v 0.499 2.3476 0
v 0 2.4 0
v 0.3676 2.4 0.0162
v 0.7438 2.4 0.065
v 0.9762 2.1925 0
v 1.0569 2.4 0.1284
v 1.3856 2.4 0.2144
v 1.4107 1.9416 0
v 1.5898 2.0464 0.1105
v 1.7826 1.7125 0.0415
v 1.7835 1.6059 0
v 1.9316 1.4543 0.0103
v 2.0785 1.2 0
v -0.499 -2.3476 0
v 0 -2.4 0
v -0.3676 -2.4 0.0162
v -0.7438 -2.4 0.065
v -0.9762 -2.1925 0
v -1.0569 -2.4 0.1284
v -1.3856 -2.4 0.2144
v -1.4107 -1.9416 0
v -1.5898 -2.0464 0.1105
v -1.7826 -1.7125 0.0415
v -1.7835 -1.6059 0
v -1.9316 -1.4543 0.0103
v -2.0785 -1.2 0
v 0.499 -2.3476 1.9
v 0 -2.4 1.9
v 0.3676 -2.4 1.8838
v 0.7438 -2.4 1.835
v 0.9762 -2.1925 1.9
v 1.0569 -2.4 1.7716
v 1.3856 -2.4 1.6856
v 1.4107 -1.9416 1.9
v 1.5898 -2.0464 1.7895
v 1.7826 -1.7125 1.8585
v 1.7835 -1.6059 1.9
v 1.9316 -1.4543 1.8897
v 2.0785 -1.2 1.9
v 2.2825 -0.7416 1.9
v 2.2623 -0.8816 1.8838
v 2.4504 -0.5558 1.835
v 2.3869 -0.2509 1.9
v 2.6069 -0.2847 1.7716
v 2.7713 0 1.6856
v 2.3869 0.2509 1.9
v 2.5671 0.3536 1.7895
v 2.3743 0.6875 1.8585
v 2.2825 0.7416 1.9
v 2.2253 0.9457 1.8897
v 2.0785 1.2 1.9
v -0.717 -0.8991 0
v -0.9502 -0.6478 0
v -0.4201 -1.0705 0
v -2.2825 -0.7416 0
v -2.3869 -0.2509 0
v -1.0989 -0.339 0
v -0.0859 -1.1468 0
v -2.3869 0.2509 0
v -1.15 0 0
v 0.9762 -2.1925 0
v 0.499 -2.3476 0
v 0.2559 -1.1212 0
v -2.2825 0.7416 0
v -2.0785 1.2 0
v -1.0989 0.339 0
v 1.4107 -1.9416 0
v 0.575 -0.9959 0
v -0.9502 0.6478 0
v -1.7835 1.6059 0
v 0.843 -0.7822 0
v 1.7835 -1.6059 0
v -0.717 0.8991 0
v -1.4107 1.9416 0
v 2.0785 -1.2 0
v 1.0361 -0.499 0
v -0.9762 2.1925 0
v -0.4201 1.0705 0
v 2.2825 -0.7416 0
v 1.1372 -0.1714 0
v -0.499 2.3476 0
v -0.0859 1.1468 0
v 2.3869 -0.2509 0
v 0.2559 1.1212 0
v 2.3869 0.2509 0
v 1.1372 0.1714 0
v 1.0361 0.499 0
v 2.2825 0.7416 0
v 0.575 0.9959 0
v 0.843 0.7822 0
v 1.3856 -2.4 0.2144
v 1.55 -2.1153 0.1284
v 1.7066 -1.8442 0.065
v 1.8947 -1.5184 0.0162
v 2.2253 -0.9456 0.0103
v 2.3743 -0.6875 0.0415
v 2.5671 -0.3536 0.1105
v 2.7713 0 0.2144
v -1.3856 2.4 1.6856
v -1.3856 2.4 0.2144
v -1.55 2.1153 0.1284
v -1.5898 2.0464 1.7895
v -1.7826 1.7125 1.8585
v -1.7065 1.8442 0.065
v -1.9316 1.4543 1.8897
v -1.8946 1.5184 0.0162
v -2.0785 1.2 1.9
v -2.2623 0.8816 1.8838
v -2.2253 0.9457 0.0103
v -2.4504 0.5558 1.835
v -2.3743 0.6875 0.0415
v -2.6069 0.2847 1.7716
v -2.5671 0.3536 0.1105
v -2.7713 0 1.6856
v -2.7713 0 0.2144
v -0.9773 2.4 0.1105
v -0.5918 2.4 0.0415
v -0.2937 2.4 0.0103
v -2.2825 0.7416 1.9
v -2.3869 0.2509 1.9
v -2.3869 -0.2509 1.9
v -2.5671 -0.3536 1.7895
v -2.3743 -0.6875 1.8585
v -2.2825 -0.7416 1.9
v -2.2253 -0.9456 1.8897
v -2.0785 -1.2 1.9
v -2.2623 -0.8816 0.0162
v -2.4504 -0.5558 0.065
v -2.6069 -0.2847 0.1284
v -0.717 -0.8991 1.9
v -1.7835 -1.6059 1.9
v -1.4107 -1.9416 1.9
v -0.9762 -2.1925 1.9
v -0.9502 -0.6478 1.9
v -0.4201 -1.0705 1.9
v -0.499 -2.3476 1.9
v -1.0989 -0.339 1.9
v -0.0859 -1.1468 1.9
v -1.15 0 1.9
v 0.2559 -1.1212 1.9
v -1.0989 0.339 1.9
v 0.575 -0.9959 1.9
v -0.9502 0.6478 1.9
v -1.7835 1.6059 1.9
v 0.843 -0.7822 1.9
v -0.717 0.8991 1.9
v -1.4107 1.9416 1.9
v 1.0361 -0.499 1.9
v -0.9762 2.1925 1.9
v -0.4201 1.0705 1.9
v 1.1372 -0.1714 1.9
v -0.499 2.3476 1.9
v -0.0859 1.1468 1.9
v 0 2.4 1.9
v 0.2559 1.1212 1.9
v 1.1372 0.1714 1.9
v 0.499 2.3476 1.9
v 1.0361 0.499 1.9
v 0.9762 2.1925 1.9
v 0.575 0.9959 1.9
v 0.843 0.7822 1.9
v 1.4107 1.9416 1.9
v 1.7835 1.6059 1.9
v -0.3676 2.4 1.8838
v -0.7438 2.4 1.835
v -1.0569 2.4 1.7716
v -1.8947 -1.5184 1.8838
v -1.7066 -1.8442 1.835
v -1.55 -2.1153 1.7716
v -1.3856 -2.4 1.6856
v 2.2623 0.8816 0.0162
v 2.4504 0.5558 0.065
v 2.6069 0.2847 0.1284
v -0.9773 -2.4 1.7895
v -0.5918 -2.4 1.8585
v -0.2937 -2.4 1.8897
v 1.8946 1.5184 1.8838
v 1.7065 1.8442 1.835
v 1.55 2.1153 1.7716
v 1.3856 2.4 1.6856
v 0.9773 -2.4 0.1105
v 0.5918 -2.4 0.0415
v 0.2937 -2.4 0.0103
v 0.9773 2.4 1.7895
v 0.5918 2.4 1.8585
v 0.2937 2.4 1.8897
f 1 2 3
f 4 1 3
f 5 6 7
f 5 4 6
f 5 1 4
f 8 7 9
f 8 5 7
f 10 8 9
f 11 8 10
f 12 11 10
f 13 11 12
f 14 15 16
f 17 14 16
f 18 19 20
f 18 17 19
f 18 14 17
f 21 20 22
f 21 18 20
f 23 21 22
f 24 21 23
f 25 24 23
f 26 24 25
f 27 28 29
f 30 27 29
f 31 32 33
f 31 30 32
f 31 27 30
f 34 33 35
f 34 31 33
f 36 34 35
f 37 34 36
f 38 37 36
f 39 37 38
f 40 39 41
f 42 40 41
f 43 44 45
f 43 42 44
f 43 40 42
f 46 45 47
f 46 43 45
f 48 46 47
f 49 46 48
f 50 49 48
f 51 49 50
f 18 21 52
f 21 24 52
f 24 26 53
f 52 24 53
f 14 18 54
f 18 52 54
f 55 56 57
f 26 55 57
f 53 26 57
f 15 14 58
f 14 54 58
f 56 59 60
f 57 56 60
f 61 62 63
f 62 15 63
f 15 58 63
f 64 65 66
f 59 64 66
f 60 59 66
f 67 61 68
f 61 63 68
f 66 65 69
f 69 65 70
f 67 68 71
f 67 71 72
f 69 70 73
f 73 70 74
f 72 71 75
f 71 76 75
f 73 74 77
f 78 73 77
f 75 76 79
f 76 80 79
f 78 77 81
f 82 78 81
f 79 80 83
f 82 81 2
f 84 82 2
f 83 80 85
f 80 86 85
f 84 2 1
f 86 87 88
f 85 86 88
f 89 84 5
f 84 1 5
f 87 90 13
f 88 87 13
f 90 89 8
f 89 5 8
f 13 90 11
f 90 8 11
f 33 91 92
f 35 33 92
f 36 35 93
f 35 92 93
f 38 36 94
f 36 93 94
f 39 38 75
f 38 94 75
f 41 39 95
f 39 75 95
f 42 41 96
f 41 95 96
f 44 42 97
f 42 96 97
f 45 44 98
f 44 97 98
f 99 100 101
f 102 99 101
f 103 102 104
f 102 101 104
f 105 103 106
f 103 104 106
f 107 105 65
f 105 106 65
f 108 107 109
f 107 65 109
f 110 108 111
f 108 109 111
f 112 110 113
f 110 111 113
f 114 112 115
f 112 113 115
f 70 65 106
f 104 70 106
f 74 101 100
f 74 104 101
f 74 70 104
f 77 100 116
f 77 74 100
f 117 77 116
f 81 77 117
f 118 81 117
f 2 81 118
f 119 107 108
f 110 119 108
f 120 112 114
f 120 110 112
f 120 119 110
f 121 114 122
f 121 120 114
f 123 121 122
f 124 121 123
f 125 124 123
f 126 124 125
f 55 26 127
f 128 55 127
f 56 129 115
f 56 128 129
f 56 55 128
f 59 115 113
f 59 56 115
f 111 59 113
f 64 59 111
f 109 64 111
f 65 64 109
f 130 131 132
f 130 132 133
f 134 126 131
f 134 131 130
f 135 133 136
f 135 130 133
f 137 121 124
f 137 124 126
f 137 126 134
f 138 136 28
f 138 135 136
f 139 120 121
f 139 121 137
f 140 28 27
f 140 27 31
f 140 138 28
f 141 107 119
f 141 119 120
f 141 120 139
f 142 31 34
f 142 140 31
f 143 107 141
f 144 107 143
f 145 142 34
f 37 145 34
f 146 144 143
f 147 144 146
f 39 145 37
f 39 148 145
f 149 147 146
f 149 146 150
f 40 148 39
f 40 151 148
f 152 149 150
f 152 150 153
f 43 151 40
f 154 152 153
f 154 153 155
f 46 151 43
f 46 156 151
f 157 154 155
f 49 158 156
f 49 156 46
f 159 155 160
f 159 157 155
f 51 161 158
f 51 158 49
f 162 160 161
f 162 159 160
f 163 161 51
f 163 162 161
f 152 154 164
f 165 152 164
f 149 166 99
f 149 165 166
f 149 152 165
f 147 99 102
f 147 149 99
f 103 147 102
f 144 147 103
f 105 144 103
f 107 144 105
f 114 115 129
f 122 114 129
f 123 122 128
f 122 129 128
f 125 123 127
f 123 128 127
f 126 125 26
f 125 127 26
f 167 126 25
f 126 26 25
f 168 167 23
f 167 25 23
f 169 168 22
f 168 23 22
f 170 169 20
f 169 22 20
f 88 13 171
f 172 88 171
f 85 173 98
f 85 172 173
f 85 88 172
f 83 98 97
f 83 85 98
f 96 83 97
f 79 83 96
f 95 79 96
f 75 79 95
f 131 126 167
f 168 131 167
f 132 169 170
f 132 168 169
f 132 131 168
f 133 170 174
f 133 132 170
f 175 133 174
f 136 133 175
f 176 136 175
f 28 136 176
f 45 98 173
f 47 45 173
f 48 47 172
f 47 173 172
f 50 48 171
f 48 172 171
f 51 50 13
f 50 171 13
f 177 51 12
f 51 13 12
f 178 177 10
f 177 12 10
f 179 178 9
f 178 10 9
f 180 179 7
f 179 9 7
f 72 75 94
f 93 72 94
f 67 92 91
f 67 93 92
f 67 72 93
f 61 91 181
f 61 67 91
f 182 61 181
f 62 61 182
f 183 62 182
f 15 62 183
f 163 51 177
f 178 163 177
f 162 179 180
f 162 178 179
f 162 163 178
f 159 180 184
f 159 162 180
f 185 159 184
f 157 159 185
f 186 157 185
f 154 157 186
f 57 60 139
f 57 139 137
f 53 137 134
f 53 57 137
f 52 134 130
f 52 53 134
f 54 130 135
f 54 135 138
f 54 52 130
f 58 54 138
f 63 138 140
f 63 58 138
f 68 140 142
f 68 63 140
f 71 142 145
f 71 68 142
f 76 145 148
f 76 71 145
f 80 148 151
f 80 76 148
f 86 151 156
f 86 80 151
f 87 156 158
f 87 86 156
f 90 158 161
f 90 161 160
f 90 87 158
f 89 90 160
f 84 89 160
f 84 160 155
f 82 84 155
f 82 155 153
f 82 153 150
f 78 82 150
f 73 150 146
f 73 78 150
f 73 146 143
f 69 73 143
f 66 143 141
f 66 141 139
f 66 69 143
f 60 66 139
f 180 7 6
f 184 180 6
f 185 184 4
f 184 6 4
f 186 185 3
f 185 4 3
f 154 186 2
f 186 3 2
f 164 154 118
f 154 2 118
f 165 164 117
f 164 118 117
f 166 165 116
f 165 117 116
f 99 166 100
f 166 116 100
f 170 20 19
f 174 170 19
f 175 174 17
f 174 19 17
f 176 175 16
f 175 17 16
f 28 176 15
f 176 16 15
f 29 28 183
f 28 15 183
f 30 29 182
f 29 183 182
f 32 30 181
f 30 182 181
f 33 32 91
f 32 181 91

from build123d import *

# Parameters (mm, degrees)
SKETCH1_R           = 1.15
BOSS_EXTRUDE1_DEPTH = 1.9
SKETCH2_OUTSIDE_W   = 43.698
SKETCH2_OUTSIDE_H   = 42.956
SKETCH2_OUTSIDE_R   = 2.4
CUT_EXTRUDE1_DEPTH  = 10
CUT_EXTRUDE1_DRAFT  = -60
SKETCH3_OUTSIDE_W   = 43.698
SKETCH3_OUTSIDE_H   = 42.956
SKETCH3_OUTSIDE_R   = 2.4
CUT_EXTRUDE2_DEPTH  = 10
CUT_EXTRUDE2_DRAFT  = -60


with BuildPart() as part:
    # Sketch1 → Boss-Extrude1 (new body)
    with BuildSketch(Plane.XY):
        Polygon((-1.385640646, 2.4), (-2.771281292, 0), (-1.385640646, -2.4), (1.385640646, -2.4), (2.771281292, 0), (1.385640646, 2.4), align=None)
        with Locations(Location((0, 0, 0), (0, 0, 180))):
            Circle(SKETCH1_R, mode=Mode.SUBTRACT)
    extrude(amount=BOSS_EXTRUDE1_DEPTH)


with BuildPart() as cut_extrude1_tool:
    # Sketch2 outside → Cut-Extrude1 (with draft: the straight prism first)
    with BuildSketch(Plane.XY.offset(1.9)):
        Rectangle(SKETCH2_OUTSIDE_W, SKETCH2_OUTSIDE_H)
        Circle(SKETCH2_OUTSIDE_R, mode=Mode.SUBTRACT)
    extrude(amount=-CUT_EXTRUDE1_DEPTH)
    # Cut-Extrude1: the draft: its side faces are tilted about the plane it starts from
    cut_extrude1_sides = [cut_extrude1_tool.faces().sort_by_distance(p)[0] for p in [
        (0, -21.478, -3.1),
        (21.849, 0, -3.1),
        (0, 21.478, -3.1),
        (-21.849, 0, -3.1),
        (-2.4, 0, -3.1),
    ]]
    draft(cut_extrude1_sides, Plane.XY.offset(1.9), CUT_EXTRUDE1_DRAFT)


with BuildPart() as part_1:
    add(part.part)

    # Cut-Extrude1: cut by cut_extrude1_tool
    add(cut_extrude1_tool.part, mode=Mode.SUBTRACT)


with BuildPart() as cut_extrude2_tool:
    # Sketch3 outside → Cut-Extrude2 (with draft: the straight prism first)
    with BuildSketch(Plane(origin=(0, 0, 0), x_dir=(-1, 0, 0), z_dir=(0, 0, -1))):
        Rectangle(SKETCH3_OUTSIDE_W, SKETCH3_OUTSIDE_H)
        Circle(SKETCH3_OUTSIDE_R, mode=Mode.SUBTRACT)
    extrude(amount=-CUT_EXTRUDE2_DEPTH)
    # Cut-Extrude2: the draft: its side faces are tilted about the plane it starts from
    cut_extrude2_sides = [cut_extrude2_tool.faces().sort_by_distance(p)[0] for p in [
        (0, -21.478, 5),
        (-21.849, 0, 5),
        (0, 21.478, 5),
        (21.849, 0, 5),
        (2.4, 0, 5),
    ]]
    draft(cut_extrude2_sides, Plane(origin=(0, 0, 0), x_dir=(-1, 0, 0), z_dir=(0, 0, -1)), CUT_EXTRUDE2_DRAFT)


with BuildPart() as part_2:
    add(part_1.part)

    # Cut-Extrude2: cut by cut_extrude2_tool
    add(cut_extrude2_tool.part, mode=Mode.SUBTRACT)


solid = part_2.part
